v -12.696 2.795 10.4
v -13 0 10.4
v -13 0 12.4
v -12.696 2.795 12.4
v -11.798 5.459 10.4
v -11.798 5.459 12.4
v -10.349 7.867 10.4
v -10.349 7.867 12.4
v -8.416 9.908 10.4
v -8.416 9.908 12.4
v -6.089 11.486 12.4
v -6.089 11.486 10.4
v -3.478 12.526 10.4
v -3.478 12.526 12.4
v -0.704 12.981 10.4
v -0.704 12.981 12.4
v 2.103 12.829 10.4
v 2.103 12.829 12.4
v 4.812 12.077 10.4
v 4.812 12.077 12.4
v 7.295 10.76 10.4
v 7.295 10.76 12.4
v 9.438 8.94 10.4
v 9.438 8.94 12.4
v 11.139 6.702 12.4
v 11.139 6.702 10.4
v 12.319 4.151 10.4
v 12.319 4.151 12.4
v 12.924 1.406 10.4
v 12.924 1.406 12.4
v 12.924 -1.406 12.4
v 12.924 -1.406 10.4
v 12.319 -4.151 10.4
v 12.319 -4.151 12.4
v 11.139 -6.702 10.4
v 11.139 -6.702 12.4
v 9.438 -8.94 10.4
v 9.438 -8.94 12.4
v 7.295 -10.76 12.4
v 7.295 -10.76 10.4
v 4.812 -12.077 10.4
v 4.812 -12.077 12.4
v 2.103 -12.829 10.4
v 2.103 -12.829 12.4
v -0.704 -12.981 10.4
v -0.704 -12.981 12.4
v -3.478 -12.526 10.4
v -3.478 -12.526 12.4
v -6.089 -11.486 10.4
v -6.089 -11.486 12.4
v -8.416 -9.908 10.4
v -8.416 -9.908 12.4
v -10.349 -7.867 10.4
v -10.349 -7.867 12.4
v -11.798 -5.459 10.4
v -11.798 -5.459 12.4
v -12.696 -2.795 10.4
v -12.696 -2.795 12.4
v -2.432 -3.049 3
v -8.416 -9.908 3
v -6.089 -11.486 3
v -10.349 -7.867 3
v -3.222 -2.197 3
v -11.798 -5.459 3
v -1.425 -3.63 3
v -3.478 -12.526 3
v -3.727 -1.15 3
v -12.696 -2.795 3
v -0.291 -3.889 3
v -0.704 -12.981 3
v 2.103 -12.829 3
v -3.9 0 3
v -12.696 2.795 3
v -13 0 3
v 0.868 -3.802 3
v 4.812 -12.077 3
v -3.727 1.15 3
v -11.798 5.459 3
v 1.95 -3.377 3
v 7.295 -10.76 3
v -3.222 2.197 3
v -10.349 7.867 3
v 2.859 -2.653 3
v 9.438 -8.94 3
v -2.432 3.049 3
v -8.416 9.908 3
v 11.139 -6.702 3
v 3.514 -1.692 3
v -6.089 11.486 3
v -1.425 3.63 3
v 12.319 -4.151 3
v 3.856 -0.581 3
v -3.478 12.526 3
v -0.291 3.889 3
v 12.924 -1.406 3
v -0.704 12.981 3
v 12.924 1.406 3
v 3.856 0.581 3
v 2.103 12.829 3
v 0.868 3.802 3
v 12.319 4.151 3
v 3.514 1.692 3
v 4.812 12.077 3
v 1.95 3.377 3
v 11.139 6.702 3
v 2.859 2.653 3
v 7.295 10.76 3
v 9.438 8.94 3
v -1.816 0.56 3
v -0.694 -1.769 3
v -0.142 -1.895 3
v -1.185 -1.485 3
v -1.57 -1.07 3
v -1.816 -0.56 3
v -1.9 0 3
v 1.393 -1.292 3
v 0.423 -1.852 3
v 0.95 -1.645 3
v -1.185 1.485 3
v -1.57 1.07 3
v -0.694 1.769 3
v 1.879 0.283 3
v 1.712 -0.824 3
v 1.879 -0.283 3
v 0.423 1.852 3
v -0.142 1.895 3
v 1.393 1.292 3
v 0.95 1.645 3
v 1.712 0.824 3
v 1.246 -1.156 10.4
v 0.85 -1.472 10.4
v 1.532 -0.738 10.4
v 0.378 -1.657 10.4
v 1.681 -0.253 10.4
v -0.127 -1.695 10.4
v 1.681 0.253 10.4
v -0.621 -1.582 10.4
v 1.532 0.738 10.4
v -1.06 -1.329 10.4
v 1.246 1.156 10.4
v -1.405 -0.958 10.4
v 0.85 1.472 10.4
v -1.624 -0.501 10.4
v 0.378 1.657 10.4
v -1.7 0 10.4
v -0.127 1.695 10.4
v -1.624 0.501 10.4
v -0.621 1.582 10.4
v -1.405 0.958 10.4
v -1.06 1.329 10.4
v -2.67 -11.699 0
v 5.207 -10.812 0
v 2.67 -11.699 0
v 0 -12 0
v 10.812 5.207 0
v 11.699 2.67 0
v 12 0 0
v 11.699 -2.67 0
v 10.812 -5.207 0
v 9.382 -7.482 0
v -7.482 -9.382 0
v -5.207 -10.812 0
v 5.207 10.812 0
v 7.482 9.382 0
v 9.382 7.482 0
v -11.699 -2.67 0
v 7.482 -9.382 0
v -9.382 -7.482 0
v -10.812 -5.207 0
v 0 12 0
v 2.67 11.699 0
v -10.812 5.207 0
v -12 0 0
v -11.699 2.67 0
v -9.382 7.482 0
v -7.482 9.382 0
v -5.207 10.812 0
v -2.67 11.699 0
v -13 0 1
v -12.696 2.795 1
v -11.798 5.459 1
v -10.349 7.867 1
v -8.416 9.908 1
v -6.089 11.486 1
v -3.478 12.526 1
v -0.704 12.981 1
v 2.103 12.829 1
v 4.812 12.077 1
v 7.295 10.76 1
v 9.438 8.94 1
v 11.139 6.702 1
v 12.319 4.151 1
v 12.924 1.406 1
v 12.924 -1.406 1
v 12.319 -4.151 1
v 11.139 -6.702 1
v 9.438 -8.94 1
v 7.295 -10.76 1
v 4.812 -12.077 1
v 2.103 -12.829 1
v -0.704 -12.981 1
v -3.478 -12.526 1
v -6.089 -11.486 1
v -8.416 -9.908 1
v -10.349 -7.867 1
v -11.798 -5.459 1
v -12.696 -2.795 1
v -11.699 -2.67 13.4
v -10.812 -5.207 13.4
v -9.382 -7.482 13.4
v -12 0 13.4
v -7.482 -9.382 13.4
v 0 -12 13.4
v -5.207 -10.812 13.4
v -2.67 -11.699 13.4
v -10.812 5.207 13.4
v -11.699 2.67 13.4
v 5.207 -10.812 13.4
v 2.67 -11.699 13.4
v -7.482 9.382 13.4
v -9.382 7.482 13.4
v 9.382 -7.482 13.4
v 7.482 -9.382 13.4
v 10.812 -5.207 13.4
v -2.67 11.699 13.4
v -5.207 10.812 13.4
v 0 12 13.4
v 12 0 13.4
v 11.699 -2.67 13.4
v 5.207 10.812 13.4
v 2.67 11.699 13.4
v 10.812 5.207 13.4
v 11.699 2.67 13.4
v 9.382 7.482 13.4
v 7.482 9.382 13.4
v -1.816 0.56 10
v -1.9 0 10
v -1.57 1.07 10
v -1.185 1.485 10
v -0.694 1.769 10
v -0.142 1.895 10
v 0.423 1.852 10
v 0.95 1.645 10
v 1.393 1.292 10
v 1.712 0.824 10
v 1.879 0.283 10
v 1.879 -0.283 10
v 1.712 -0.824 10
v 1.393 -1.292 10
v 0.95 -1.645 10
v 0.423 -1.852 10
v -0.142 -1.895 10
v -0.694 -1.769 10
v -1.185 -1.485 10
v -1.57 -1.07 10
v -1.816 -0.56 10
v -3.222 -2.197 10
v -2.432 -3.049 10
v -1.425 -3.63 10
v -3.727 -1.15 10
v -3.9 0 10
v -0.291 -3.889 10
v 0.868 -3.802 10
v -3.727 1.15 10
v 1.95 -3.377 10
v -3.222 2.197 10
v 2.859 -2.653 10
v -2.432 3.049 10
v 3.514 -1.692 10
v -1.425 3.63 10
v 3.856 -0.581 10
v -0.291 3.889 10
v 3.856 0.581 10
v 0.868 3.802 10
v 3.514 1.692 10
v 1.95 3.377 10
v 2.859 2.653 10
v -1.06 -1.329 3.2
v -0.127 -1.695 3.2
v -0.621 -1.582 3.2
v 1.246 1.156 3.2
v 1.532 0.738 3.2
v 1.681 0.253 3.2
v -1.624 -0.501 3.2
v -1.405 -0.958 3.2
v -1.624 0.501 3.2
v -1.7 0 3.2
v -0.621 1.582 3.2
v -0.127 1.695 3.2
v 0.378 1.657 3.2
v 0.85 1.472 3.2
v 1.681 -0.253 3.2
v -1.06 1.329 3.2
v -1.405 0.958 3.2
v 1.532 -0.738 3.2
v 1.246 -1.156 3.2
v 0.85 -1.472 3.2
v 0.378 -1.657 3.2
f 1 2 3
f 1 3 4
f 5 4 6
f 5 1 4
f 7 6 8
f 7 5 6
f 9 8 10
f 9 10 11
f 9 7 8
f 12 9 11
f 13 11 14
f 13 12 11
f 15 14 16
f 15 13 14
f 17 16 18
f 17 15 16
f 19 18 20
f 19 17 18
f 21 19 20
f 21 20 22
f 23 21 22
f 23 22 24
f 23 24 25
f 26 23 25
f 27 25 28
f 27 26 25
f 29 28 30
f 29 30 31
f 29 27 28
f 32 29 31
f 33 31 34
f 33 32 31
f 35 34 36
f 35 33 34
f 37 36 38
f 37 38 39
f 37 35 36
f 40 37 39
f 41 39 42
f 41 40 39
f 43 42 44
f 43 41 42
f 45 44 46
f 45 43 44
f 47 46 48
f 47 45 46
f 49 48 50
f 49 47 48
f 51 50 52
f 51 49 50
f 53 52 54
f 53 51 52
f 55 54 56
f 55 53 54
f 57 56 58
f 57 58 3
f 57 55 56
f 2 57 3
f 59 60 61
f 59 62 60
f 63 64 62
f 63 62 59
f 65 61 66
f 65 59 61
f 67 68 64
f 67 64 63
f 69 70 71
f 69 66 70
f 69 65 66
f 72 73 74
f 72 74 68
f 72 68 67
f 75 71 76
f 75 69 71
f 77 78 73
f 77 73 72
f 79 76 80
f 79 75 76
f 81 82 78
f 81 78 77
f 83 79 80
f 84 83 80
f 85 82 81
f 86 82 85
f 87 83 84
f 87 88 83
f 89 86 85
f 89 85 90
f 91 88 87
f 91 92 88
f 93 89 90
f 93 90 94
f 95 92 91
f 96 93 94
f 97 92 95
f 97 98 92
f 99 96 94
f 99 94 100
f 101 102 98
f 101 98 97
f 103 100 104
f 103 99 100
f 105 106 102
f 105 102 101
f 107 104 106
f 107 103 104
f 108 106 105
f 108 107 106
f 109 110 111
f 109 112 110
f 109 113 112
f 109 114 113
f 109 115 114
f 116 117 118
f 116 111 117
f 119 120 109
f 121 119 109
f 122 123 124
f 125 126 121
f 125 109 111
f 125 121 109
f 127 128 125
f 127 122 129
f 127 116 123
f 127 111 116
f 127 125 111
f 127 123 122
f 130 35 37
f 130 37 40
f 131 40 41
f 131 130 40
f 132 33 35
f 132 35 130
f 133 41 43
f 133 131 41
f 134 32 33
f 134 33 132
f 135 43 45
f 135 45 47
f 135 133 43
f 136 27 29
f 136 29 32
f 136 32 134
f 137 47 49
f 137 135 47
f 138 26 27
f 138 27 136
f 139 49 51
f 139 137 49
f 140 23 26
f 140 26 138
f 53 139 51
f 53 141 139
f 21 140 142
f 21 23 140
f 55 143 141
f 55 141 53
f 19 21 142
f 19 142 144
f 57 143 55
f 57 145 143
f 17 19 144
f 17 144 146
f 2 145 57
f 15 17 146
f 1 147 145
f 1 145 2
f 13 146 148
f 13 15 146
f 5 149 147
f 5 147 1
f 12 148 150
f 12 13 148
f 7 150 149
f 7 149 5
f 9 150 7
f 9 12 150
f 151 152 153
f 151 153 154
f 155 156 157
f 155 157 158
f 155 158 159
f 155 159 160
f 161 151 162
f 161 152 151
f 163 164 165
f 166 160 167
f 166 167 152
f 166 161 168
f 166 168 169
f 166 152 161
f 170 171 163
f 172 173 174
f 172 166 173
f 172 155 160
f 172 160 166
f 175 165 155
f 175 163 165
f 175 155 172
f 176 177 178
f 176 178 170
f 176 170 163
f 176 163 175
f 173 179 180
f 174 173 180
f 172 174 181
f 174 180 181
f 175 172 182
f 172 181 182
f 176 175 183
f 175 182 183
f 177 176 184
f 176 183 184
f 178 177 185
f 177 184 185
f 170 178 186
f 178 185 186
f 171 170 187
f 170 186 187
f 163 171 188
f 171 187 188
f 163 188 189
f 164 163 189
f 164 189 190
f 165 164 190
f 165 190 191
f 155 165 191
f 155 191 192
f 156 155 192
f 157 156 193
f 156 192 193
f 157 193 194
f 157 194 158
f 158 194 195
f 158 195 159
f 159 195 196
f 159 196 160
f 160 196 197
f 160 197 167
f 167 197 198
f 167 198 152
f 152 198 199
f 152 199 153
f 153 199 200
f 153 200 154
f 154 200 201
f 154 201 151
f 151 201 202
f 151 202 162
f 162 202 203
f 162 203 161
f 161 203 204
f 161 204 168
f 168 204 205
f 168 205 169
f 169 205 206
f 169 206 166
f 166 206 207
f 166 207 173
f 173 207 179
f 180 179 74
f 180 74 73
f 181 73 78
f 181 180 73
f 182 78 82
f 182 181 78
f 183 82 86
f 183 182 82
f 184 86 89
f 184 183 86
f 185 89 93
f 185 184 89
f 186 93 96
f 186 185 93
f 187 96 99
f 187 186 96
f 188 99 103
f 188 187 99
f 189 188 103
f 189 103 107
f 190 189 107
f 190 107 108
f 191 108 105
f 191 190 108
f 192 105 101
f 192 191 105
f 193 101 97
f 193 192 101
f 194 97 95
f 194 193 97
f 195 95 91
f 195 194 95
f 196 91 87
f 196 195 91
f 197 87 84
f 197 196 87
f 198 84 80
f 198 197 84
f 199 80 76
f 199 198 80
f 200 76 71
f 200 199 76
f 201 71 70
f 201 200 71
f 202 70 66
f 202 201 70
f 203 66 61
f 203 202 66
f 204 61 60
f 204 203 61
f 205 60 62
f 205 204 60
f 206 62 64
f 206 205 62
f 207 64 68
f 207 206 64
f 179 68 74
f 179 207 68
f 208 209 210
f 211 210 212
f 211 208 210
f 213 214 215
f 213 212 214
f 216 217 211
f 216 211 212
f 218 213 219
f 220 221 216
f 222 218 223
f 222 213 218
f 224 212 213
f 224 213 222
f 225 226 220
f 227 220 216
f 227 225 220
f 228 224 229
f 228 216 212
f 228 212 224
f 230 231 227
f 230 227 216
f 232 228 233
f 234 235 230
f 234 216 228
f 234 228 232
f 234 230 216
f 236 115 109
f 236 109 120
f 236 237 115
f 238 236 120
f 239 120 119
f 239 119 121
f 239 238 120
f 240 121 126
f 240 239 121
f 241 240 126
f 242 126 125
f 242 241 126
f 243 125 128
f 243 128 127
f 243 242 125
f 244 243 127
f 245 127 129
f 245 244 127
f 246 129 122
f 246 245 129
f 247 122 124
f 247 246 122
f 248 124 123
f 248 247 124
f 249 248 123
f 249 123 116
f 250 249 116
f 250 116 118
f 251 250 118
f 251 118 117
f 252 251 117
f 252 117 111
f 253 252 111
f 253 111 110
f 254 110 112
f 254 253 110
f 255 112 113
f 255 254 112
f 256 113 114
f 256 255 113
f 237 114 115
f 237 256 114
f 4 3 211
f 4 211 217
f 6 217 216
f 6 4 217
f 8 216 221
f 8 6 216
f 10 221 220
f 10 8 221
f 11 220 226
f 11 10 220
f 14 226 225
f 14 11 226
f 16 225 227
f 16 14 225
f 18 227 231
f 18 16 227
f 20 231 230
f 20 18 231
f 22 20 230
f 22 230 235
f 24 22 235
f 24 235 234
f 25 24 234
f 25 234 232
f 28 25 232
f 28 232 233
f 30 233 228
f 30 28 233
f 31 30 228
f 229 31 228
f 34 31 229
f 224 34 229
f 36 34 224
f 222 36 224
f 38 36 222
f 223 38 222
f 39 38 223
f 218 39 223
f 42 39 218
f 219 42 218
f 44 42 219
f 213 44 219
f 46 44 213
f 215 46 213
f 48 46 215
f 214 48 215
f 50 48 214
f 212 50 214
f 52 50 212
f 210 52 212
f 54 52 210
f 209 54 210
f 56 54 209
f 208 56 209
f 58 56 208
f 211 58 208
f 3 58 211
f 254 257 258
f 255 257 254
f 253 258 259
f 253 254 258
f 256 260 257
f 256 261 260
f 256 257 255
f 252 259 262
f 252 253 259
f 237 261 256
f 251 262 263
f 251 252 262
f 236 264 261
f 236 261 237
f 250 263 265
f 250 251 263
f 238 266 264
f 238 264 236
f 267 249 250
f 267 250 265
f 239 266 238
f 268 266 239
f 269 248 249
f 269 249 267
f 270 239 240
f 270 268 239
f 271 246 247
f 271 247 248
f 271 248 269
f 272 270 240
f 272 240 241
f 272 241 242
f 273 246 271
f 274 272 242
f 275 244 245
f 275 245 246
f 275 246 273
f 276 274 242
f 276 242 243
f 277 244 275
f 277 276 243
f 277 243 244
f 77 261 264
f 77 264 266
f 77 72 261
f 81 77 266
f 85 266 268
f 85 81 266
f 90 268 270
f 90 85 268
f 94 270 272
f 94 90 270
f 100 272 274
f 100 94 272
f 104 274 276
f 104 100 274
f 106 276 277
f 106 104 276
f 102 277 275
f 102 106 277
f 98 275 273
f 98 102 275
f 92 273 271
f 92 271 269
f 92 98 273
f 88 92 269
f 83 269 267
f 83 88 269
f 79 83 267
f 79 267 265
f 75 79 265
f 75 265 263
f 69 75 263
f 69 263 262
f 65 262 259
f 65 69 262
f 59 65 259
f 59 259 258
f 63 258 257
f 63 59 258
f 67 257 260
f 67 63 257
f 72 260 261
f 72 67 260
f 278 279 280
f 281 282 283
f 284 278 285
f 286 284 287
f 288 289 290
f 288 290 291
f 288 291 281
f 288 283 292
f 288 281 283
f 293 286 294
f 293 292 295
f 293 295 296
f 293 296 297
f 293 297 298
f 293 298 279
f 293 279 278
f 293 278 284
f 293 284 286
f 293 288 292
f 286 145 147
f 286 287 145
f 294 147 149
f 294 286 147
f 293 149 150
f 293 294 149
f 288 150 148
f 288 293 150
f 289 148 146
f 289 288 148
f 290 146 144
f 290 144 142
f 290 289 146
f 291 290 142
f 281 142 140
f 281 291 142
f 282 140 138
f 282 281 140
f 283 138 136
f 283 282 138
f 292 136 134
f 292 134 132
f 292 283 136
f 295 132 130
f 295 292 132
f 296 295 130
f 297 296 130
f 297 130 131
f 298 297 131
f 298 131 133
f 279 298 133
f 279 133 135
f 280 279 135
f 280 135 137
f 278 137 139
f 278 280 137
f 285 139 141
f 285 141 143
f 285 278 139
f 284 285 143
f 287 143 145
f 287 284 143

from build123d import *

# Parameters (mm, degrees)
F2_SIZE = 1
F5_SIZE = 1


with BuildPart() as f1:
    # F0 (on Front) → F1 (revolve)
    with BuildSketch(Plane.XZ):
        Polygon((-13, 0), (0, 0), (0, 3), (-1.9, 3), (-1.9, 10), (-3.9, 10), (-3.9, 3), (-13, 3), align=None)
    revolve(axis=Axis((0, 0, 1.5), (0, 0, -1)))

    # F2
    f2_edges = [f1.edges().sort_by_distance(p)[0] for p in [
        (13, 0, 0),
    ]]
    chamfer(f2_edges, length=F2_SIZE)


with BuildPart() as f4:
    # F3 (on Front) → F4 (revolve)
    with BuildSketch(Plane.XZ):
        Polygon((-1.7, 3.2), (0, 3.2), (0, 13.4), (-12.999942, 13.4), (-12.999942, 10.4), (-1.7, 10.4), align=None)
    revolve(axis=Axis((0, 0, 8.3), (0, 0, -1)))

    # F5
    f5_edges = [f4.edges().sort_by_distance(p)[0] for p in [
        (12.999942, 0, 13.4),
    ]]
    chamfer(f5_edges, length=F5_SIZE)


solid = Compound([f1.part, f4.part])
